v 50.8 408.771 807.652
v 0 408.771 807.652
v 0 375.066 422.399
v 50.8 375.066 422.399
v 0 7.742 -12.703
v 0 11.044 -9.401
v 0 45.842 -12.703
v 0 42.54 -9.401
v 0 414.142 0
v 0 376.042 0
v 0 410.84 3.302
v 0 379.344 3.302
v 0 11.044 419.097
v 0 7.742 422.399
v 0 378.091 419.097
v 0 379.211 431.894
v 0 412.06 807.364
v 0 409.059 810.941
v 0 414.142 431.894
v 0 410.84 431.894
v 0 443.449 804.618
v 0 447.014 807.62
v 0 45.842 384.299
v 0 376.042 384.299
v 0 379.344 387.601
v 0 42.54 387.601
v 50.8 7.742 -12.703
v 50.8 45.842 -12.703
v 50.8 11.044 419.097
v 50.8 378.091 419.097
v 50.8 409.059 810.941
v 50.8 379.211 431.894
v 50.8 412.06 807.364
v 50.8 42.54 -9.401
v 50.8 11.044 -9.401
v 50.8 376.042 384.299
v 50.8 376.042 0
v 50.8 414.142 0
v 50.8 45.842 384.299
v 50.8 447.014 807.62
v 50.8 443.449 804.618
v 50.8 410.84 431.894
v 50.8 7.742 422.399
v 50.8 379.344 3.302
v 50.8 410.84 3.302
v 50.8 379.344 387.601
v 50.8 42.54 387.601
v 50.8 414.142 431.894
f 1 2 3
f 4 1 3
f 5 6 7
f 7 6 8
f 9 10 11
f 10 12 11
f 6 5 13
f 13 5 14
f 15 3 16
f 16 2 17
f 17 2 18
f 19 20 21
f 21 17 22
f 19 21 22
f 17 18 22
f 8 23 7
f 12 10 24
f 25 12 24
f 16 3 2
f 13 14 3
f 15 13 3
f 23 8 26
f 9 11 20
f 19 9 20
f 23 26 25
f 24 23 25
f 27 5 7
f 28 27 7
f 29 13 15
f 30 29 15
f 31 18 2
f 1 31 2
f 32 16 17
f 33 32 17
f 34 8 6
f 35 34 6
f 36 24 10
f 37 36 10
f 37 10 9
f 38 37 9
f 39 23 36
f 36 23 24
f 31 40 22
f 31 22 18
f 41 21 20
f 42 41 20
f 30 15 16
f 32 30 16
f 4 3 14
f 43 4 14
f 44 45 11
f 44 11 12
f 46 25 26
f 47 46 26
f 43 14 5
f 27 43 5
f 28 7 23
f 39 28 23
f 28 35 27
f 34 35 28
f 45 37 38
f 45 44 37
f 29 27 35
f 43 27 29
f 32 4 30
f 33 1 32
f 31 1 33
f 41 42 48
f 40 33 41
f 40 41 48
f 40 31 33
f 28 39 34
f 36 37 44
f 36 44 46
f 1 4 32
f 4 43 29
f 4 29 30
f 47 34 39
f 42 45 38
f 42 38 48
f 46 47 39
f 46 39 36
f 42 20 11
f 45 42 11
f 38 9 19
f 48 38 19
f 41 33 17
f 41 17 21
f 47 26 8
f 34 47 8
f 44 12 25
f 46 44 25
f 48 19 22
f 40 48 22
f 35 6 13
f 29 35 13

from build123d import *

# Parameters (mm, degrees)
F1_DEPTH = 50.8


with BuildPart() as f1:
    # F0 (on Right) → F1 (new body)
    with BuildSketch(Plane.YZ):
        Polygon((7.742018, -9.401204), (7.742018, -12.703204), (45.842018, -12.703204), (45.842018, -9.401204), (45.842018, 384.298796), (376.042018, 384.298796), (376.042018, 4.826), (376.042018, 0), (379.344018, 0), (414.142018, 0), (414.142018, 431.894088), (447.013809, 807.620389), (409.058791, 810.941023), (408.771003, 807.651588), (375.065751, 422.398796), (7.742018, 422.398796), (7.742018, 419.096796), align=None)
        Polygon((42.540018, -9.401204), (11.044018, -9.401204), (11.044018, 419.096796), (374.776864, 419.096796), (378.091477, 419.096796), (379.211095, 431.894088), (412.060438, 807.3638), (443.449104, 804.617647), (410.840018, 431.894088), (410.840018, 3.302), (379.344018, 3.302), (379.344018, 384.298796), (379.344018, 387.600796), (376.042018, 387.600796), (42.540018, 387.600796), (42.540018, 384.298796), align=None, mode=Mode.SUBTRACT)
    extrude(amount=F1_DEPTH)


solid = f1.part
